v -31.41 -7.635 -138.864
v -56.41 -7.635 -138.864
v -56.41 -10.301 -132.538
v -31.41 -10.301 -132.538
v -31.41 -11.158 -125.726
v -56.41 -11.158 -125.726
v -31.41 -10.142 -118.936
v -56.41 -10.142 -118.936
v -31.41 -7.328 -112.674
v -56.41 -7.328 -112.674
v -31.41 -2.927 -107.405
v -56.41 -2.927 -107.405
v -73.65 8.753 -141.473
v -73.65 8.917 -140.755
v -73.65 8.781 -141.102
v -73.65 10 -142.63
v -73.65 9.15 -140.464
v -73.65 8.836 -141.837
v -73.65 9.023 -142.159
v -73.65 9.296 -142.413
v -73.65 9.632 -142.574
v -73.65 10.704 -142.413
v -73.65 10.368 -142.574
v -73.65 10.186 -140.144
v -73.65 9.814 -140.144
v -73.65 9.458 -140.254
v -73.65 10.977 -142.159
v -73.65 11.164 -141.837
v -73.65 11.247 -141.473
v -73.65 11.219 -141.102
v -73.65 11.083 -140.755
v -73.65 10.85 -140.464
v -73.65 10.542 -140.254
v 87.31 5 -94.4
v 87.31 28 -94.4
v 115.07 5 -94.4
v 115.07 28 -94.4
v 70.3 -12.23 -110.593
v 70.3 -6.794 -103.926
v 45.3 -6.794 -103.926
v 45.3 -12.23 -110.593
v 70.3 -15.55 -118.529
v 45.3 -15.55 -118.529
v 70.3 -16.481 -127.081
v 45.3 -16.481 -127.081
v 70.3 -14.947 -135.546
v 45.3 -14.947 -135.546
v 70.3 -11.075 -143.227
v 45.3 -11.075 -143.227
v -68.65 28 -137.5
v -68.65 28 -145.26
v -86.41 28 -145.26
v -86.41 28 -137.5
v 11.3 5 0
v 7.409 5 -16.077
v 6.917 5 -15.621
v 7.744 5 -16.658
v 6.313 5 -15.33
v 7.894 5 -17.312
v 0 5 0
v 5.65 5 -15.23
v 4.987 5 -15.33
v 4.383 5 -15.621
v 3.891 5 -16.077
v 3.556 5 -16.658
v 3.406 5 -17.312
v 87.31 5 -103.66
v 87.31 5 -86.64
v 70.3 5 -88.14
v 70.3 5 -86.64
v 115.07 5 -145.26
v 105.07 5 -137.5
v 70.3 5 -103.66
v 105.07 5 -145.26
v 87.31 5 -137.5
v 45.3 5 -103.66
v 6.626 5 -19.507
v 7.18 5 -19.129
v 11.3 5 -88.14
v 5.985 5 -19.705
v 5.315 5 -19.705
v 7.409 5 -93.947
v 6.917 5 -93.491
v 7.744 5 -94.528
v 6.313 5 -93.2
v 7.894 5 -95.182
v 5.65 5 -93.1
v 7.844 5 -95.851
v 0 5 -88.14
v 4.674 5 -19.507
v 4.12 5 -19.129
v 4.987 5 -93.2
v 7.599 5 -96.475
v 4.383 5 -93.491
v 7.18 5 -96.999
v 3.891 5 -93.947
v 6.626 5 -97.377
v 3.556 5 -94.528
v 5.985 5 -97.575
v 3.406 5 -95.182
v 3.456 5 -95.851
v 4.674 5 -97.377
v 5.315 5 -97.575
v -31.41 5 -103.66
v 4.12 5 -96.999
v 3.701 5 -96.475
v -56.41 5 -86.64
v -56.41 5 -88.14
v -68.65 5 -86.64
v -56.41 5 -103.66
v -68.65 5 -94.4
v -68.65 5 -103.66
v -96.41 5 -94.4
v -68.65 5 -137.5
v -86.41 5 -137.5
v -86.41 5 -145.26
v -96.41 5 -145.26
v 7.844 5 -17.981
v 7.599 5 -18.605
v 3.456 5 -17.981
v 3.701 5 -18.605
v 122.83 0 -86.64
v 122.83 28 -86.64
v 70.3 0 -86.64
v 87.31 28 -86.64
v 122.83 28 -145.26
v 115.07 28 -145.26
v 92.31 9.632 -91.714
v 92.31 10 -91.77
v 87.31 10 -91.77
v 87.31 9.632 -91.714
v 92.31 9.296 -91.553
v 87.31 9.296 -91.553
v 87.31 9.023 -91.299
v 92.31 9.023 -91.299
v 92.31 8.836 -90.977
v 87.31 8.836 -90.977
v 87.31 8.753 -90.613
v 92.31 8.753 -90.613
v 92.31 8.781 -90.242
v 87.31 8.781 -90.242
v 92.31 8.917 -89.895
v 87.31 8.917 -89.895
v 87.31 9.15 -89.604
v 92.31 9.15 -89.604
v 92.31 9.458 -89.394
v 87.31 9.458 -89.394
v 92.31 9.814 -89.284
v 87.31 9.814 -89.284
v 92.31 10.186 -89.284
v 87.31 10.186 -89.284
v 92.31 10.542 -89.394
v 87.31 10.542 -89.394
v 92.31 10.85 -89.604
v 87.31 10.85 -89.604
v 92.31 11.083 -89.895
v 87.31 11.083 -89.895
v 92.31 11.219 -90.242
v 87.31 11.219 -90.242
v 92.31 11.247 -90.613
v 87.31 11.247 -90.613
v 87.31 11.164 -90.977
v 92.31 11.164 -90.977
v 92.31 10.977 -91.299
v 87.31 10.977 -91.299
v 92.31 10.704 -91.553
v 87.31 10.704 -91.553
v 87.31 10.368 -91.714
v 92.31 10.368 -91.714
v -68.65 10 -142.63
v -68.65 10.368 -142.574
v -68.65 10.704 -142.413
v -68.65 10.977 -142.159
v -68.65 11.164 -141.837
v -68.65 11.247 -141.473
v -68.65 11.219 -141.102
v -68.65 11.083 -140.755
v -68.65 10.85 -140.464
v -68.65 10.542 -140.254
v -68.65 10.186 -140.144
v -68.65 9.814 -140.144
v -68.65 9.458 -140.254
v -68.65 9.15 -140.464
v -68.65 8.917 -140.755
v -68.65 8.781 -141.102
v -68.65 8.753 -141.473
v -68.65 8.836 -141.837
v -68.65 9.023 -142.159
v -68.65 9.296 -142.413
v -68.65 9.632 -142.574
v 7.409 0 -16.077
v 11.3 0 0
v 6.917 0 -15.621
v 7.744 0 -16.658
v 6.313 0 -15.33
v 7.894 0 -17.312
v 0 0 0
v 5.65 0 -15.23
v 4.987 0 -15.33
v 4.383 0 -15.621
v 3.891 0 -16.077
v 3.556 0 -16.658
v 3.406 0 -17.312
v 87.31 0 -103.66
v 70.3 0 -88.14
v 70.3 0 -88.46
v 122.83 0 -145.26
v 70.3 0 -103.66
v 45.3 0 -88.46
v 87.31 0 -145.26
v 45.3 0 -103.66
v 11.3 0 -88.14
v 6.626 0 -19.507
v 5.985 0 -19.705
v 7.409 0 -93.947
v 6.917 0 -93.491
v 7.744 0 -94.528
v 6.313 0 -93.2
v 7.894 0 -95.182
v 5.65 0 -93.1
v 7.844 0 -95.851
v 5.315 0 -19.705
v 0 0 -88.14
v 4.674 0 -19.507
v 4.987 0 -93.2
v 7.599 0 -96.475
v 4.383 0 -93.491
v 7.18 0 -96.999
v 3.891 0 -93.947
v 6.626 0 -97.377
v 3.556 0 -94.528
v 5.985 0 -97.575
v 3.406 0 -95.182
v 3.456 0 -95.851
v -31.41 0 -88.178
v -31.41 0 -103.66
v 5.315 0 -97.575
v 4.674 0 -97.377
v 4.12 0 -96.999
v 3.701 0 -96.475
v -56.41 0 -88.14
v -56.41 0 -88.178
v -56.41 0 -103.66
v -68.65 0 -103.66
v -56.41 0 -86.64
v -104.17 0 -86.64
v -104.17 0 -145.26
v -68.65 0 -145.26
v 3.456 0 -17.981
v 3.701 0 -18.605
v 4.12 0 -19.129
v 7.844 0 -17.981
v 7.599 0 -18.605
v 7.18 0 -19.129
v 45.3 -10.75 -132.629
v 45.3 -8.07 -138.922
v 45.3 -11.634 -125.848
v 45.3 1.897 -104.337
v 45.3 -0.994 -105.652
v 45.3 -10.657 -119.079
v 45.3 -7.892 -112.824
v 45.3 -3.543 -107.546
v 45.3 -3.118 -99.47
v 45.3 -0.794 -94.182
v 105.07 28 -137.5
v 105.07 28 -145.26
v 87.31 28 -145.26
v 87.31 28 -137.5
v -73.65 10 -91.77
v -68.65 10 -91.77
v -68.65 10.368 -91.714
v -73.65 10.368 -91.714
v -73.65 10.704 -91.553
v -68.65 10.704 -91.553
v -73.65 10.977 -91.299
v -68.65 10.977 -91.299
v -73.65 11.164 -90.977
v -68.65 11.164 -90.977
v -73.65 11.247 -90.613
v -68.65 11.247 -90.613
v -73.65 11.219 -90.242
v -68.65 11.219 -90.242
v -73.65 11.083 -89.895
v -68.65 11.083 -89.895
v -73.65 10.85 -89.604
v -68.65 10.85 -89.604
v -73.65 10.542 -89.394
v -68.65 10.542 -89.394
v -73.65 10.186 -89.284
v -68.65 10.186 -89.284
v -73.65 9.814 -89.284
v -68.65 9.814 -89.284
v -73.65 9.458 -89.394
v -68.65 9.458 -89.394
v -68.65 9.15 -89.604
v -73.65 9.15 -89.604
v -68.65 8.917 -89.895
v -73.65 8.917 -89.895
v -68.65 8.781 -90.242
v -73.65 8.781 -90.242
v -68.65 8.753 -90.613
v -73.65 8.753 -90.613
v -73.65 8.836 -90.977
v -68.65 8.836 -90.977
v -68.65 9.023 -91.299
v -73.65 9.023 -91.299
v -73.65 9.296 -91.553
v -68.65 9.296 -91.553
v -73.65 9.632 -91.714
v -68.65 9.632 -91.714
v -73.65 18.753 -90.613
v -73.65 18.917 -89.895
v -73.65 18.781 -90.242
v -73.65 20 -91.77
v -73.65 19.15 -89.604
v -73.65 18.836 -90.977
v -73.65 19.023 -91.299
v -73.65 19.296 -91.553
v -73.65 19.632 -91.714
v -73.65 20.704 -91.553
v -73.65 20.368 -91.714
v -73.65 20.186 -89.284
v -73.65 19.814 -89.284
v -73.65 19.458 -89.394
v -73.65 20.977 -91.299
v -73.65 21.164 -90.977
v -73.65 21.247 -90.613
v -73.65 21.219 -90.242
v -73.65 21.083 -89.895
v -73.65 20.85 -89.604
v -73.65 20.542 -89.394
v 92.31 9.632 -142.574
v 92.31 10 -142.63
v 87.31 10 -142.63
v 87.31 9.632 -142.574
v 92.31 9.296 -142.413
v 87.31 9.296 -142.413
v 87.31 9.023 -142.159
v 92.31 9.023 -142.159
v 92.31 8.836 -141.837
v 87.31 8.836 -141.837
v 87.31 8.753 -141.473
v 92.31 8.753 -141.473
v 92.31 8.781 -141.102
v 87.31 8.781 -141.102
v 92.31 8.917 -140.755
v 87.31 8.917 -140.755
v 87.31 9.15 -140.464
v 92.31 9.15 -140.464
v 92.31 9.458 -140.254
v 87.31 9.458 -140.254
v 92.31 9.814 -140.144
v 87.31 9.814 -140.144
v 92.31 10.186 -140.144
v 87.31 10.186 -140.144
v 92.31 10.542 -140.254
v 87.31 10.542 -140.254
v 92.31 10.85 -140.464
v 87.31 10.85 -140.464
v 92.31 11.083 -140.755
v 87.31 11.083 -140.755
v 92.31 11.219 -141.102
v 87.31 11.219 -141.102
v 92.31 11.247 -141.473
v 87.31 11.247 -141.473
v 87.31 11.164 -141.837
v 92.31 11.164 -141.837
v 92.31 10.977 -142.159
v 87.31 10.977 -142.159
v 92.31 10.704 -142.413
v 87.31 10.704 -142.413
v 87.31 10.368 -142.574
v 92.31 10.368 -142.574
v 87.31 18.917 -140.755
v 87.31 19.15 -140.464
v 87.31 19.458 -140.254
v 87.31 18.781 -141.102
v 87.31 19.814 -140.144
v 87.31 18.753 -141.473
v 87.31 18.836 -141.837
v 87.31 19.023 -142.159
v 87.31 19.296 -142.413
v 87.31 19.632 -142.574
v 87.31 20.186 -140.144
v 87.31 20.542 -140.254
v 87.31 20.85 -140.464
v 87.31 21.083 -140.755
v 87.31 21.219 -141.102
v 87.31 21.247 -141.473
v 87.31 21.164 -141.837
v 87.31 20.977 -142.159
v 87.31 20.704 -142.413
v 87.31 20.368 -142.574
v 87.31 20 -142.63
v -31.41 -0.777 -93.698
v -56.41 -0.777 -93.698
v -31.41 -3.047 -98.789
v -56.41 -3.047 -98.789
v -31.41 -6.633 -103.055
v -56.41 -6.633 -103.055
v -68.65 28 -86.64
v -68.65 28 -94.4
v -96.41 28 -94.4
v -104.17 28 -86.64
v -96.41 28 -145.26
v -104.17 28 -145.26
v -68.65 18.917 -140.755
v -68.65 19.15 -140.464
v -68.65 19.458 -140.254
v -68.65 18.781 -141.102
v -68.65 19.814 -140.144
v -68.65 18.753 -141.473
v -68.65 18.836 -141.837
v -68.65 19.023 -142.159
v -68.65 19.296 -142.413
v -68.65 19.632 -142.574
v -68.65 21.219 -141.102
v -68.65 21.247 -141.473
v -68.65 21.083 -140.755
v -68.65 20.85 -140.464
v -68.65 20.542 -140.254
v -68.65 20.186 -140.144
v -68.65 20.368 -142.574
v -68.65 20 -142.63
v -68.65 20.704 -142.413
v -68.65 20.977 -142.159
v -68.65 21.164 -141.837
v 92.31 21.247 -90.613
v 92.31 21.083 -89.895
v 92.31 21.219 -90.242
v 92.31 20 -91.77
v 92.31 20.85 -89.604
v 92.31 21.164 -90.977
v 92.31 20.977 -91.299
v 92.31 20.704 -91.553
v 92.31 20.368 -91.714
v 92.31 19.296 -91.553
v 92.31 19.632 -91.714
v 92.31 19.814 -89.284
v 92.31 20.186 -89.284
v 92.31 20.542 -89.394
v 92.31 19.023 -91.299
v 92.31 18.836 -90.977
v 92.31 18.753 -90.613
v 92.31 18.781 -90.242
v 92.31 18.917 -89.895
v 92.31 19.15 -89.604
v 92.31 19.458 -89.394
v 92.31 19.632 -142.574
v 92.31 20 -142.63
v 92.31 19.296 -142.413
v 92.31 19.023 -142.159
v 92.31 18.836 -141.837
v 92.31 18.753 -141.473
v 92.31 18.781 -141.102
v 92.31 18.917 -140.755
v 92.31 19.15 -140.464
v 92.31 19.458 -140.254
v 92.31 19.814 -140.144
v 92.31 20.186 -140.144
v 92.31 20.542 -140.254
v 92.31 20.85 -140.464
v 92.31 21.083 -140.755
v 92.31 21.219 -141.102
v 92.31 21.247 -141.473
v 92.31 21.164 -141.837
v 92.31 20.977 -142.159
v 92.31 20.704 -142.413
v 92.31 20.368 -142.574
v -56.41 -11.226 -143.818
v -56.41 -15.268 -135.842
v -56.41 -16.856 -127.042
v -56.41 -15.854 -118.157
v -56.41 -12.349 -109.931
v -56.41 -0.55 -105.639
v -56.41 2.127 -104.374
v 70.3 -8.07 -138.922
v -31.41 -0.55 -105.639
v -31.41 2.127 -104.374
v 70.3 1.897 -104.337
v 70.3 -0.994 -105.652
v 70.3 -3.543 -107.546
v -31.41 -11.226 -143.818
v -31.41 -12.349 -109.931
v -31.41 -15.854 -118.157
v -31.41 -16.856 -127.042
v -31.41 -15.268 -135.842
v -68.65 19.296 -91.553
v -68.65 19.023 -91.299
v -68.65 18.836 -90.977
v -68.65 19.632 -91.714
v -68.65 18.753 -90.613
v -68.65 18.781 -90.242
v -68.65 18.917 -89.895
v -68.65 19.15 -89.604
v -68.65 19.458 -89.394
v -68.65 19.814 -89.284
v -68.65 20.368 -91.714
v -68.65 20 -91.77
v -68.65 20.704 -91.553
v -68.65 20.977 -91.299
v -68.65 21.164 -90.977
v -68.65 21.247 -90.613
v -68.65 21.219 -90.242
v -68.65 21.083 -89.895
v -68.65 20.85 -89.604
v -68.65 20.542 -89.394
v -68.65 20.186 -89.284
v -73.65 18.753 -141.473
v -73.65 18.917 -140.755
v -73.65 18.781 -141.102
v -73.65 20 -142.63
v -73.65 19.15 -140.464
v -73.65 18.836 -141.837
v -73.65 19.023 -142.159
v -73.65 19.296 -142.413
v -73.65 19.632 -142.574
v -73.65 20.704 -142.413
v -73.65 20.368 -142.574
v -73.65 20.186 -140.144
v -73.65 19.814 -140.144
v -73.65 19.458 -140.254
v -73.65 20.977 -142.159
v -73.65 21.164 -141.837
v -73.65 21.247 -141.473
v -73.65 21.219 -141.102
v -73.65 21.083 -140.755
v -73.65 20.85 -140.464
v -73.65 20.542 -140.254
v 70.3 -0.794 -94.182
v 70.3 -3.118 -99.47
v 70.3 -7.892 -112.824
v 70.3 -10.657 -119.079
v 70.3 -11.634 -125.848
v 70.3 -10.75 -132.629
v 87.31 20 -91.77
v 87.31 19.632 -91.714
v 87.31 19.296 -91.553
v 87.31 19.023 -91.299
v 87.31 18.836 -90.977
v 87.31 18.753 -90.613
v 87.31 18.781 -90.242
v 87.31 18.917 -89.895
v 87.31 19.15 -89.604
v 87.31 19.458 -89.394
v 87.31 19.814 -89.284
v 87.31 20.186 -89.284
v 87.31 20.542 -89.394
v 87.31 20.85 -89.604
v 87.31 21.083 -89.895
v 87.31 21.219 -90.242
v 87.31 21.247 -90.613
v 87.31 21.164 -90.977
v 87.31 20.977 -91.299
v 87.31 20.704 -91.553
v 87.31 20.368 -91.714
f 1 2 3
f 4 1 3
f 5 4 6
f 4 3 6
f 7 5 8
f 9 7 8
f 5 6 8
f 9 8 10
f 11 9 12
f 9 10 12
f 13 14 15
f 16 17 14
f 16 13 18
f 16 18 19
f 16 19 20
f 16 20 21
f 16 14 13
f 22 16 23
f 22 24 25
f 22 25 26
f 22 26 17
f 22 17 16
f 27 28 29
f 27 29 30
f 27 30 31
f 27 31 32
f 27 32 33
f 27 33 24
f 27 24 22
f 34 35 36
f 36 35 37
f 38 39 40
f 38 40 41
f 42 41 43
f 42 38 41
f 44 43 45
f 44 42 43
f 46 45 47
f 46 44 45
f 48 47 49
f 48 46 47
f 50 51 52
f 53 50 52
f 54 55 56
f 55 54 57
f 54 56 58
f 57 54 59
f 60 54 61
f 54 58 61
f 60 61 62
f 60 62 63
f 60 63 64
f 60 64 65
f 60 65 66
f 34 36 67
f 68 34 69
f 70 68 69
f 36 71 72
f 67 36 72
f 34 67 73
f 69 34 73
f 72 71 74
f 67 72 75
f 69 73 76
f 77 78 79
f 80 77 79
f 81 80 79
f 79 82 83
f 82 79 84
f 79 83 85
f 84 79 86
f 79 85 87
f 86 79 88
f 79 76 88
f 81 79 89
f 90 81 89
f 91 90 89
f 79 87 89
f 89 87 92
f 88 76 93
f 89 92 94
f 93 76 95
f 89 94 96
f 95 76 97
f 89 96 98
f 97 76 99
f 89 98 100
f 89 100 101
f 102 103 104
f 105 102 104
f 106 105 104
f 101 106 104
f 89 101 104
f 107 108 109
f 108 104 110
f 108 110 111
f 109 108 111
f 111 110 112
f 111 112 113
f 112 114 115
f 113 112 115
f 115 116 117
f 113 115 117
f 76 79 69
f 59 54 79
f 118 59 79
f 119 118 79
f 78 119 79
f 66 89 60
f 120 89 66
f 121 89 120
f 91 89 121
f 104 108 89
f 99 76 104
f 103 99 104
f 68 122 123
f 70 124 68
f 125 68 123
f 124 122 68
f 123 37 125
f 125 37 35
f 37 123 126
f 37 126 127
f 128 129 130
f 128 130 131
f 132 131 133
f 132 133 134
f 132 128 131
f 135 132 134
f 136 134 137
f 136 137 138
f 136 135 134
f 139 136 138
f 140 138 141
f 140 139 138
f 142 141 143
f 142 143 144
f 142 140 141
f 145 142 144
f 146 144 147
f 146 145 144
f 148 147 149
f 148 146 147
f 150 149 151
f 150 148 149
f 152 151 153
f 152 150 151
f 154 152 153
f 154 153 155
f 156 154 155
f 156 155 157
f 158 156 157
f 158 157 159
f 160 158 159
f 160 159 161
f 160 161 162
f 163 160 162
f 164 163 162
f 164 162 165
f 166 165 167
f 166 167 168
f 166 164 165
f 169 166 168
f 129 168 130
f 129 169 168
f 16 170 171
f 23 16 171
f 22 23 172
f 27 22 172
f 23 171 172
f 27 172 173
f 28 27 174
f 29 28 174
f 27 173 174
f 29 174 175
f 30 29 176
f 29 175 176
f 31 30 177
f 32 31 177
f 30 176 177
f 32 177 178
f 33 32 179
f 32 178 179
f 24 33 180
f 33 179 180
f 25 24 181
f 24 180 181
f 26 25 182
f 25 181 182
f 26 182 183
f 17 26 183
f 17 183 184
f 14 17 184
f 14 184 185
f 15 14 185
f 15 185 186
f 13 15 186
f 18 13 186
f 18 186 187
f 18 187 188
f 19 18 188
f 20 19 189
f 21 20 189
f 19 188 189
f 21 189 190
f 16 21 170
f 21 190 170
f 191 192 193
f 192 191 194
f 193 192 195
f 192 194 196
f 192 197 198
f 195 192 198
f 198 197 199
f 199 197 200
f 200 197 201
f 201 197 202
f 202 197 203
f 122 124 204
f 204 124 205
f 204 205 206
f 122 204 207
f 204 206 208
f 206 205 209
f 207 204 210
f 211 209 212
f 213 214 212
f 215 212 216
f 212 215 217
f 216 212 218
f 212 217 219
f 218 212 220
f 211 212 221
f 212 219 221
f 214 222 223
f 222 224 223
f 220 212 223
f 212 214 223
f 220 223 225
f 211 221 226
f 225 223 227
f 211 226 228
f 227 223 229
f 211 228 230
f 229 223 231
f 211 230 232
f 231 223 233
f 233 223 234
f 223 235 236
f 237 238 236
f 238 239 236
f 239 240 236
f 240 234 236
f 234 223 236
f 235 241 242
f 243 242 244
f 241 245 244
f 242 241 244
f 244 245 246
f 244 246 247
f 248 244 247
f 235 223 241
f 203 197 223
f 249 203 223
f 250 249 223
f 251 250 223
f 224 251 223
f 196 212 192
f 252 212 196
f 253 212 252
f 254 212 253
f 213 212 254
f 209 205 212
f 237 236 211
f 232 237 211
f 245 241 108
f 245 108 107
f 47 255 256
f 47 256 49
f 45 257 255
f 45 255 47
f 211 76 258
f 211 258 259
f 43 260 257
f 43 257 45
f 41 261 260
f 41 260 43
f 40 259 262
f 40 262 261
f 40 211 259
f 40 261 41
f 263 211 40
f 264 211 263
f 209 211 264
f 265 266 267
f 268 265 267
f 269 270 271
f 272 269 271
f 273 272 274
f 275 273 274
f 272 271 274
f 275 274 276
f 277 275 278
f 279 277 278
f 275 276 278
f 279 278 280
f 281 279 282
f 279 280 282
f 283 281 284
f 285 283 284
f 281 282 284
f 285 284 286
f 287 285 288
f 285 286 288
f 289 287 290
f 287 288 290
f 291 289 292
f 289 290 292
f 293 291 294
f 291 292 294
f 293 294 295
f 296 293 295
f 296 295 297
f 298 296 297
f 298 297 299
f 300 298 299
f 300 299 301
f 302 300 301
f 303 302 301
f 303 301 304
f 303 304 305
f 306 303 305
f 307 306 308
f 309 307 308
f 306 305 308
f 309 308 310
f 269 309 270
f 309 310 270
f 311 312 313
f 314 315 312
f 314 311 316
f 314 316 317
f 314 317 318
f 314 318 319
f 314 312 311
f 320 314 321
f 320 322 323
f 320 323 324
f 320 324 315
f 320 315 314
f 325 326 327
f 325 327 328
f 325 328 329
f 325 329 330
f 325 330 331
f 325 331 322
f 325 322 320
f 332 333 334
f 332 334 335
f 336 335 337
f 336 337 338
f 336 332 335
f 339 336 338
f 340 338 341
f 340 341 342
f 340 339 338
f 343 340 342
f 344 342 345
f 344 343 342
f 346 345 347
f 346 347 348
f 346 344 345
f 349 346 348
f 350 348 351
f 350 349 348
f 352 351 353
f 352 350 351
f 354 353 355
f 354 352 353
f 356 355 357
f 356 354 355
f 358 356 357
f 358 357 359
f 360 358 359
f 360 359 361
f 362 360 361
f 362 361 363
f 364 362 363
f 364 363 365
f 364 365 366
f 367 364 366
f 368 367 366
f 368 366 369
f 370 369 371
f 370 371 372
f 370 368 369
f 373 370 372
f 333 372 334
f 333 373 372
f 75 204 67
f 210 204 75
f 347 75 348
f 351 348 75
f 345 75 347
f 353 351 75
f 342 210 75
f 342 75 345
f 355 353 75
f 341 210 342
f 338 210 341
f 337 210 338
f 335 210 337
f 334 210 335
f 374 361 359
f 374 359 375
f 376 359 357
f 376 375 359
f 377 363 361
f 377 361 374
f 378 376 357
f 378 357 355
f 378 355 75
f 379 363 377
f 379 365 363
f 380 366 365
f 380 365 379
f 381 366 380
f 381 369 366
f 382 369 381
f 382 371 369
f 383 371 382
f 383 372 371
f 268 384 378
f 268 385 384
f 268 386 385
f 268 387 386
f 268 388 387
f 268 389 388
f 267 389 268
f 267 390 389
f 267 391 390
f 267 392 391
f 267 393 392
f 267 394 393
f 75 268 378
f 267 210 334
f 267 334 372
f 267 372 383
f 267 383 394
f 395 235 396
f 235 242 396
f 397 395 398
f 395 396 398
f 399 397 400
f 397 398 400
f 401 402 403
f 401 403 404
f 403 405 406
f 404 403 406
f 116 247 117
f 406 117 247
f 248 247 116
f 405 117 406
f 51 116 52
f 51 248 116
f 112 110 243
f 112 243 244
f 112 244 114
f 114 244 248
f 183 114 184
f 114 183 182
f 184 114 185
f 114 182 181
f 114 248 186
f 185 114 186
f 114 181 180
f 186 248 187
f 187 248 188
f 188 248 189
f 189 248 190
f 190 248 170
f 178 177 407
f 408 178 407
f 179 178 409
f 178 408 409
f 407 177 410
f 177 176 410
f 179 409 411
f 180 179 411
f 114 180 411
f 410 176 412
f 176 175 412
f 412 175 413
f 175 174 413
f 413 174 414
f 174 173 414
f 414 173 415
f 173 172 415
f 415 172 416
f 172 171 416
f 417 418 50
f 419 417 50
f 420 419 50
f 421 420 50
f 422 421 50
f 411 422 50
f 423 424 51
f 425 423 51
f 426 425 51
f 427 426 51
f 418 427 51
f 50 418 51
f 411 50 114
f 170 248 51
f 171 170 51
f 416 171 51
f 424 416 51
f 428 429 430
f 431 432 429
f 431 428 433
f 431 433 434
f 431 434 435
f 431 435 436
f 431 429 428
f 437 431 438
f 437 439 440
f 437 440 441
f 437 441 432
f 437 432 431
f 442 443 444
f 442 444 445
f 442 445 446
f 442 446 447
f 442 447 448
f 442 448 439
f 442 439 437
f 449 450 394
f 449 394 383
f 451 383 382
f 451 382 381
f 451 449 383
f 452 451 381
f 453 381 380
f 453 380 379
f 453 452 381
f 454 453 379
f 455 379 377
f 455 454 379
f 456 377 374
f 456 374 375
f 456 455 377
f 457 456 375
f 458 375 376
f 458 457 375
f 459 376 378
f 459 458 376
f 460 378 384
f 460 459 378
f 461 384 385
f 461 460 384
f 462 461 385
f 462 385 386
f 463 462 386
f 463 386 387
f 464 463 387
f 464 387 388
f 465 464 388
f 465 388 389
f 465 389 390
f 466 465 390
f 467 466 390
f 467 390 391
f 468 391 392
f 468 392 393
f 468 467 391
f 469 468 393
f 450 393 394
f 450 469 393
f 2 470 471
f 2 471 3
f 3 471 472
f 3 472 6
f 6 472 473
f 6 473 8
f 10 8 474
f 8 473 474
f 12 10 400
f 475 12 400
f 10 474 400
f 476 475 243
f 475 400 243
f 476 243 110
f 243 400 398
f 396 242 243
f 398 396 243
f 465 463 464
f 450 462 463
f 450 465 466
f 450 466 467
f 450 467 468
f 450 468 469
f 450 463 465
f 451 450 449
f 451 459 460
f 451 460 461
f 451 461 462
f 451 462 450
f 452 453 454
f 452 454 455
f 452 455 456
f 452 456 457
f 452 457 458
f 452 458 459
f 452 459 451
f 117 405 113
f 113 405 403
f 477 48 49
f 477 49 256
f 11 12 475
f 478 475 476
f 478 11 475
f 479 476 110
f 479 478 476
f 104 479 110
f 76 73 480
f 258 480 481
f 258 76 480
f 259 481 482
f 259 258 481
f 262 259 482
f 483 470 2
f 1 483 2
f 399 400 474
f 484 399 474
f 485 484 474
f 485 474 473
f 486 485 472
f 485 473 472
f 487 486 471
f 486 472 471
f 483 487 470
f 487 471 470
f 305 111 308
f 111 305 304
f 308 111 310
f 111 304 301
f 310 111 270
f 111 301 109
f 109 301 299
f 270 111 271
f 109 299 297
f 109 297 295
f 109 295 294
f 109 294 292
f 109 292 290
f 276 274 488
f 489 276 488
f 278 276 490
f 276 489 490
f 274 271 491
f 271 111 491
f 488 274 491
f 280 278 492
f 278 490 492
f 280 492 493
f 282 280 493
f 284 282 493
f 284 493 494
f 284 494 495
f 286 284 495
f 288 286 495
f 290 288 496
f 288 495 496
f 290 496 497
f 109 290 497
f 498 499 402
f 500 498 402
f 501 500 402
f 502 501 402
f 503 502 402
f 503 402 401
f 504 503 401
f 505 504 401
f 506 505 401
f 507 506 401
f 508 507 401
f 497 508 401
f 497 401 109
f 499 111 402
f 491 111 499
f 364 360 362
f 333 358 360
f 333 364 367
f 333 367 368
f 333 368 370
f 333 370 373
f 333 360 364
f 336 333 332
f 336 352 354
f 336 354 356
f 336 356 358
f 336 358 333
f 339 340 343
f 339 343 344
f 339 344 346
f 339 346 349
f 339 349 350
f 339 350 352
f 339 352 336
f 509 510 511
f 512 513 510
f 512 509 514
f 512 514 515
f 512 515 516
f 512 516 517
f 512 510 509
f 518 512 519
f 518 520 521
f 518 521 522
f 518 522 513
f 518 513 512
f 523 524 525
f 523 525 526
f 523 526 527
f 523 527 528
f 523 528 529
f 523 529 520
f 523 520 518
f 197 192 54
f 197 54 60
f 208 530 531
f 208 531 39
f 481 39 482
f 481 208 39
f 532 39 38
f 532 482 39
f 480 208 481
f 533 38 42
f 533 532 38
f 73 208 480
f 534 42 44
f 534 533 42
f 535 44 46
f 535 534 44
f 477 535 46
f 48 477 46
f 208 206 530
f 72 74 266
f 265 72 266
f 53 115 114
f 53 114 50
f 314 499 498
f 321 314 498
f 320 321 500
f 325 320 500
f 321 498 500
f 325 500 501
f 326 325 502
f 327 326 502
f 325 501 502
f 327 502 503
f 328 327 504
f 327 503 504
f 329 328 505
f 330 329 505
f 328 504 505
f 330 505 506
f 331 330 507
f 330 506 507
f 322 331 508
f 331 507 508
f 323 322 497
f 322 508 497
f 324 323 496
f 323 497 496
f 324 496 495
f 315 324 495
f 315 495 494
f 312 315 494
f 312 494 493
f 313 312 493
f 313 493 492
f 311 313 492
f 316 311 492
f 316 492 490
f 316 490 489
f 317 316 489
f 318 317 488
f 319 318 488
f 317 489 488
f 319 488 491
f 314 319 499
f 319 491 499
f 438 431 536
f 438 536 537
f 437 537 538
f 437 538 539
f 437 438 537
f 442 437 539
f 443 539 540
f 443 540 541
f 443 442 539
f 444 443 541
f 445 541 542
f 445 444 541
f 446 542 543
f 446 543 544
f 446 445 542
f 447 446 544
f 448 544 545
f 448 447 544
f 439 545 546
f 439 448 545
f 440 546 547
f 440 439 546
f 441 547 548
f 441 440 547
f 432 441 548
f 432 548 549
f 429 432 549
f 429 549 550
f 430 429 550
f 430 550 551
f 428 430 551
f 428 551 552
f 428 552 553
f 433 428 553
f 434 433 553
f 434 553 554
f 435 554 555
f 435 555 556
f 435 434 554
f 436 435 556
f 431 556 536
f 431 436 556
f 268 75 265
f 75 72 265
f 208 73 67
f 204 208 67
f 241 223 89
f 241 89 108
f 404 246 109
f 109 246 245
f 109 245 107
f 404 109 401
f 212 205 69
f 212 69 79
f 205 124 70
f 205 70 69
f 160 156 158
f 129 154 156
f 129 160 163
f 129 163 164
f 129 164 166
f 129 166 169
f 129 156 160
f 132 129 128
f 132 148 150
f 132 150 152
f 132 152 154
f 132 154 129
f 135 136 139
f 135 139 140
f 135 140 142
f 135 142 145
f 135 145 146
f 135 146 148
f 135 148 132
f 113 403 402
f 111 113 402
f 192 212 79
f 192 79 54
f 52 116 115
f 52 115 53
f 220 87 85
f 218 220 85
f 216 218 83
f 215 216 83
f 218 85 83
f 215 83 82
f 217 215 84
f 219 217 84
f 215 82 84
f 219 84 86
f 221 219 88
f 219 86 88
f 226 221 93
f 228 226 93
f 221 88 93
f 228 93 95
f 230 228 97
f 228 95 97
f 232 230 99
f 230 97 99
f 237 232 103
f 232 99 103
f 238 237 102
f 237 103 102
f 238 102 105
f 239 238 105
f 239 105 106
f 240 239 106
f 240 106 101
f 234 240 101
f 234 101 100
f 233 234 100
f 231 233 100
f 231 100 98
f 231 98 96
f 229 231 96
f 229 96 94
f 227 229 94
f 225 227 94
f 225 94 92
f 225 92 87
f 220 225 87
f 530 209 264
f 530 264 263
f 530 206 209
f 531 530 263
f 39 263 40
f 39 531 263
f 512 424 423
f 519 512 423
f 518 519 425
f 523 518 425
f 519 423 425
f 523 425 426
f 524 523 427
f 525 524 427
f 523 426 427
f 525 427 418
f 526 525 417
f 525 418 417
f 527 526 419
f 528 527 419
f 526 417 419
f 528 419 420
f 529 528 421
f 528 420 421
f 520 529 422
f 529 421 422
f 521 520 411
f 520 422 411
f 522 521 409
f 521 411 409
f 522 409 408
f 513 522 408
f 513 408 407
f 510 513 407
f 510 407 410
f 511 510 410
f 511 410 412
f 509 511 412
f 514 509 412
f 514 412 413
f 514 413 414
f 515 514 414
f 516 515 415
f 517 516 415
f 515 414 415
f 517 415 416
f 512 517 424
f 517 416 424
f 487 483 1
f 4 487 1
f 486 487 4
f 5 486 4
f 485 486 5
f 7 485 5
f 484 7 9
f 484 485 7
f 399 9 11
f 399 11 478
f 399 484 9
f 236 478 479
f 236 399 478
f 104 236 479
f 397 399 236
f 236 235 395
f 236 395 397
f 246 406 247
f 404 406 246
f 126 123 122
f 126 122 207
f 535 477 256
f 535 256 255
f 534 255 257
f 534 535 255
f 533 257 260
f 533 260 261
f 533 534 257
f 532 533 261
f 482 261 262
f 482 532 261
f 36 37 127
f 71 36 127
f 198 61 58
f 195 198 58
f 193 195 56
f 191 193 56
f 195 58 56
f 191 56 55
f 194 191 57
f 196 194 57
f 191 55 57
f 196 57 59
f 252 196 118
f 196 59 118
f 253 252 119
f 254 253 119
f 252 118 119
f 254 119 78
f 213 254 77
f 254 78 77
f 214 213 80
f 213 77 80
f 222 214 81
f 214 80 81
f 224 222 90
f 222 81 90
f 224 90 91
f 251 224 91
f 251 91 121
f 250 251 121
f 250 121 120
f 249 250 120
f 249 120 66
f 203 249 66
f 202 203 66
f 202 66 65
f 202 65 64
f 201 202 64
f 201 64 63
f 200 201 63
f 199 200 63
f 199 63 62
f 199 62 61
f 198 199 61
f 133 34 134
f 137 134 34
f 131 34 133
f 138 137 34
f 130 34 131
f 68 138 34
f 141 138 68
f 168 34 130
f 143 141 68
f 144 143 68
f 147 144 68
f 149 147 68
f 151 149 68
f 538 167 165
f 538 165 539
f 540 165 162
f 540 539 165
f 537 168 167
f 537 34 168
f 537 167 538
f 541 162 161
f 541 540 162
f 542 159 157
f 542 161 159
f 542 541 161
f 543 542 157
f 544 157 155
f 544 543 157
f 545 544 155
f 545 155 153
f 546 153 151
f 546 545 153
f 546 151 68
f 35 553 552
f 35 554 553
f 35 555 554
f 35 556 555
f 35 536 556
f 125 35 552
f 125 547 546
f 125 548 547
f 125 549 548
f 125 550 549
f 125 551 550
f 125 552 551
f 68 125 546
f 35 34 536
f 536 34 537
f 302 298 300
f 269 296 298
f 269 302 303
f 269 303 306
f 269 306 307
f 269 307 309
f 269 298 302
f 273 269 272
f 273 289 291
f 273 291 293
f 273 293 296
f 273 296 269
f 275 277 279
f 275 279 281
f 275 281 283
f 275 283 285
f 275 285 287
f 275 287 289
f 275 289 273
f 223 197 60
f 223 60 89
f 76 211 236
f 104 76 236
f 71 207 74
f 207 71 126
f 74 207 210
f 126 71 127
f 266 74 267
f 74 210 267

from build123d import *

# Parameters (mm, degrees)
BOSS_EXTRUDE1_DEPTH  = 5
SKETCH6_W            = 1.81
SKETCH6_H            = 7.76
SKETCH6_W_2          = 18.76
BOSS_EXTRUDE2_DEPTH  = 28
BOSS_EXTRUDE3_REACH  = 259.198
SKETCH7_W            = 7.76
SKETCH7_H            = 5
SKETCH9_W            = 27.76
SKETCH9_H            = 5
BOSS_EXTRUDE4_DEPTH  = 58.62
BOSS_EXTRUDE5_REACH  = 189.418
SKETCH10_W           = 27.76
SKETCH10_H           = 7.76
SKETCH11_W           = 58.62
SKETCH11_H           = 33
BOSS_EXTRUDE6_DEPTH  = 7.76
SKETCH12_R           = 2.25
CUT_EXTRUDE1_DEPTH   = 188.418175479
SKETCH13_W           = 1.81
SKETCH13_H           = 7.76
SKETCH13_W_2         = 18.76
BOSS_EXTRUDE7_DEPTH  = 28
BOSS_EXTRUDE8_REACH  = 265.563
SKETCH14_W           = 7.76
SKETCH14_H           = 5
SKETCH15_W           = 27.76
SKETCH15_H           = 5
BOSS_EXTRUDE9_DEPTH  = 50.86
BOSS_EXTRUDE10_REACH = 189.418
SKETCH16_W           = 27.76
SKETCH16_H           = 7.76
SKETCH17_W           = 58.62
SKETCH17_H           = 33
BOSS_EXTRUDE11_DEPTH = 7.76
CUT_EXTRUDE4_REACH   = 195.072
SKETCH23_W           = 35.52
SKETCH23_H           = 5
CUT_EXTRUDE5_REACH   = 195.072
SKETCH24_W           = 35.52
SKETCH24_H           = 5
SKETCH25_W           = 7.76
SKETCH25_H           = 23
CUT_EXTRUDE6_DEPTH   = 1.81
SKETCH26_W           = 7.76
SKETCH26_H           = 23
CUT_EXTRUDE7_DEPTH   = 1.81
SKETCH27_R           = 1.25
CUT_EXTRUDE8_DEPTH   = 5
CUT_EXTRUDE9_START   = -5
SKETCH28_R           = 1.25
CUT_EXTRUDE9_DEPTH   = 5
BOSS_EXTRUDE14_DEPTH = 25
SKETCH30_W           = 7.667684365
SKETCH30_H           = 9.552630881
CUT_EXTRUDE13_DEPTH  = 30
FILLET2_R            = 15
CUT_EXTRUDE14_REACH  = 193.616
SKETCH31_W           = 5
SKETCH31_H           = 41.6
FILLET6_R            = 21
BOSS_EXTRUDE15_DEPTH = 25
FILLET7_R            = 15
FILLET8_R            = 20
SKETCH37_W           = 7.377214054
SKETCH37_H           = 9
CUT_EXTRUDE16_DEPTH  = 25
CUT_EXTRUDE17_REACH  = 194.28
SKETCH38_W           = 1
SKETCH38_H           = 23
SKETCH39_W           = 12.24
SKETCH39_H           = 5
SKETCH39_W_2         = 12.01
CUT_EXTRUDE19_DEPTH  = 41.6


with BuildPart() as part:
    # Sketch5 → Boss-Extrude1 (new body)
    with BuildSketch(Plane(origin=(0, 0, 0), x_dir=(1, 0, 0), z_dir=(0, 1, 0))):
        Polygon((0, 0), (0, 88.14), (-56.41, 88.14), (-56.41, 86.64), (-96.41, 86.64), (-96.41, 145.26), (-56.41, 145.26), (-56.41, 103.66), (9.075, 103.66), (70.3, 103.66), (70.3, 145.26), (115.07, 145.26), (115.07, 86.64), (70.3, 86.64), (70.3, 88.14), (11.3, 88.14), (11.3, 0), align=None)
    extrude(amount=BOSS_EXTRUDE1_DEPTH)

    # Sketch6 → Boss-Extrude2 (add)
    with BuildSketch(Plane(origin=(0, 5, 0), x_dir=(1, 0, 0), z_dir=(0, 1, 0))):
        with Locations((-95.505, 141.38)):
            Rectangle(SKETCH6_W, SKETCH6_H)
        with Locations((-78.03, 141.38)):
            Rectangle(SKETCH6_W_2, SKETCH6_H)
    extrude(amount=BOSS_EXTRUDE2_DEPTH)

    # Sketch7 → Boss-Extrude3 (add, up to next)
    with BuildSketch(Plane(origin=(-94.6, 0, 0), x_dir=(0, 0, -1), z_dir=(1, 0, 0)), mode=Mode.PRIVATE) as boss_extrude3_sk1:
        with Locations((141.38, 30.5)):
            Rectangle(SKETCH7_W, SKETCH7_H)
    boss_extrude3_tool1 = extrude(boss_extrude3_sk1.sketch, amount=BOSS_EXTRUDE3_REACH, mode=Mode.PRIVATE) - part.part
    add(boss_extrude3_tool1.solids().sort_by_distance((-94.6, 30.5, -141.38))[0])

    # Sketch9 → Boss-Extrude4 (add)
    with BuildSketch(Plane(origin=(0, 0, -145.26), x_dir=(-1, 0, 0), z_dir=(0, 0, -1))):
        with Locations((82.53, 30.5)):
            Rectangle(SKETCH9_W, SKETCH9_H)
    extrude(amount=-BOSS_EXTRUDE4_DEPTH)

    # Sketch10 → Boss-Extrude5 (add, up to next)
    with BuildSketch(Plane.XZ.offset(-28), mode=Mode.PRIVATE) as boss_extrude5_sk1:
        with Locations((-82.53, -90.52)):
            Rectangle(SKETCH10_W, SKETCH10_H)
    boss_extrude5_tool1 = extrude(boss_extrude5_sk1.sketch, amount=BOSS_EXTRUDE5_REACH, mode=Mode.PRIVATE) - part.part
    add(boss_extrude5_tool1.solids().sort_by_distance((-82.53, 28, -90.52))[0])

    # Sketch11 → Boss-Extrude6 (add)
    with BuildSketch(Plane.ZY.offset(96.41)):
        with Locations((-115.95, 16.5)):
            Rectangle(SKETCH11_W, SKETCH11_H)
    extrude(amount=BOSS_EXTRUDE6_DEPTH)

    # Sketch12 → Cut-Extrude1 (cut, through all)
    with BuildSketch(Plane(origin=(0, 5, 0), x_dir=(1, 0, 0), z_dir=(0, 1, 0))):
        with Locations(Location((5.65, 17.48, 0), (0, 0, 270))):
            Circle(SKETCH12_R)
        with Locations(Location((5.65, 95.35, 0), (0, 0, 270))):
            Circle(SKETCH12_R)
    extrude(amount=-CUT_EXTRUDE1_DEPTH, mode=Mode.SUBTRACT)

    # Sketch13 → Boss-Extrude7 (add)
    with BuildSketch(Plane(origin=(0, 5, 0), x_dir=(1, 0, 0), z_dir=(0, 1, 0))):
        with Locations((114.165, 141.38)):
            Rectangle(SKETCH13_W, SKETCH13_H)
        with Locations((96.69, 141.38)):
            Rectangle(SKETCH13_W_2, SKETCH13_H)
    extrude(amount=BOSS_EXTRUDE7_DEPTH)

    # Sketch14 → Boss-Extrude8 (add, up to next)
    with BuildSketch(Plane.ZY.offset(-113.26), mode=Mode.PRIVATE) as boss_extrude8_sk1:
        with Locations((-141.38, 30.5)):
            Rectangle(SKETCH14_W, SKETCH14_H)
    boss_extrude8_tool1 = extrude(boss_extrude8_sk1.sketch, amount=BOSS_EXTRUDE8_REACH, mode=Mode.PRIVATE) - part.part
    add(boss_extrude8_tool1.solids().sort_by_distance((113.26, 30.5, -141.38))[0])

    # Sketch15 → Boss-Extrude9 (add)
    with BuildSketch(Plane.XY.offset(-137.5)):
        with Locations((101.19, 30.5)):
            Rectangle(SKETCH15_W, SKETCH15_H)
    extrude(amount=BOSS_EXTRUDE9_DEPTH)

    # Sketch16 → Boss-Extrude10 (add, up to next)
    with BuildSketch(Plane.XZ.offset(-28), mode=Mode.PRIVATE) as boss_extrude10_sk1:
        with Locations((101.19, -90.52)):
            Rectangle(SKETCH16_W, SKETCH16_H)
    boss_extrude10_tool1 = extrude(boss_extrude10_sk1.sketch, amount=BOSS_EXTRUDE10_REACH, mode=Mode.PRIVATE) - part.part
    add(boss_extrude10_tool1.solids().sort_by_distance((101.19, 28, -90.52))[0])

    # Sketch17 → Boss-Extrude11 (add)
    with BuildSketch(Plane(origin=(115.07, 0, 0), x_dir=(0, 0, -1), z_dir=(1, 0, 0))):
        with Locations((115.95, 16.5)):
            Rectangle(SKETCH17_W, SKETCH17_H)
    extrude(amount=BOSS_EXTRUDE11_DEPTH)

    # Sketch23 → Cut-Extrude4 (cut, up to next)
    with BuildSketch(Plane(origin=(0, 0, -145.26), x_dir=(-1, 0, 0), z_dir=(0, 0, -1)), mode=Mode.PRIVATE) as cut_extrude4_sk1:
        with Locations((-105.07, 30.5)):
            Rectangle(SKETCH23_W, SKETCH23_H)
    cut_extrude4_tool1 = extrude(cut_extrude4_sk1.sketch, amount=-CUT_EXTRUDE4_REACH, mode=Mode.PRIVATE) & part.part
    add(cut_extrude4_tool1.solids().sort_by_distance((105.07, 30.5, -145.26))[0], mode=Mode.SUBTRACT)

    # Sketch24 → Cut-Extrude5 (cut, up to next)
    with BuildSketch(Plane(origin=(0, 0, -145.26), x_dir=(-1, 0, 0), z_dir=(0, 0, -1)), mode=Mode.PRIVATE) as cut_extrude5_sk1:
        with Locations((86.41, 30.5)):
            Rectangle(SKETCH24_W, SKETCH24_H)
    cut_extrude5_tool1 = extrude(cut_extrude5_sk1.sketch, amount=-CUT_EXTRUDE5_REACH, mode=Mode.PRIVATE) & part.part
    add(cut_extrude5_tool1.solids().sort_by_distance((-86.41, 30.5, -145.26))[0], mode=Mode.SUBTRACT)

    # Sketch25 → Cut-Extrude6 (cut)
    with BuildSketch(Plane(origin=(-94.6, 0, 0), x_dir=(0, 0, -1), z_dir=(1, 0, 0))):
        with Locations((141.38, 16.5)):
            Rectangle(SKETCH25_W, SKETCH25_H)
    extrude(amount=-CUT_EXTRUDE6_DEPTH, mode=Mode.SUBTRACT)

    # Sketch26 → Cut-Extrude7 (cut)
    with BuildSketch(Plane.ZY.offset(-113.26)):
        with Locations((-141.38, 16.5)):
            Rectangle(SKETCH26_W, SKETCH26_H)
    extrude(amount=-CUT_EXTRUDE7_DEPTH, mode=Mode.SUBTRACT)

    # Sketch27 → Cut-Extrude8 (cut)
    with BuildSketch(Plane(origin=(-68.65, 0, 0), x_dir=(0, 0, -1), z_dir=(1, 0, 0))):
        with Locations((141.38, 10)):
            Circle(SKETCH27_R)
        with Locations((141.38, 20)):
            Circle(SKETCH27_R)
        with Locations((90.52, 10)):
            Circle(SKETCH27_R)
        with Locations((90.52, 20)):
            Circle(SKETCH27_R)
    extrude(amount=-CUT_EXTRUDE8_DEPTH, mode=Mode.SUBTRACT)

    # Sketch28 → Cut-Extrude9 (cut)
    with BuildSketch(Plane.ZY.offset(-87.31).offset(CUT_EXTRUDE9_START)):
        with Locations(Location((-90.52, 10, 0), (0, 0, 180))):
            Circle(SKETCH28_R)
        with Locations(Location((-90.52, 20, 0), (0, 0, 180))):
            Circle(SKETCH28_R)
        with Locations(Location((-141.38, 10, 0), (0, 0, 180))):
            Circle(SKETCH28_R)
        with Locations(Location((-141.38, 20, 0), (0, 0, 180))):
            Circle(SKETCH28_R)
    extrude(amount=CUT_EXTRUDE9_DEPTH, mode=Mode.SUBTRACT)

    # Sketch29 → Boss-Extrude14 (add)
    with BuildSketch(Plane.ZY.offset(-70.3)):
        with BuildLine():
            Line((-100.885806154, 13.5), (-96.02, 13.5))
            ThreePointArc((-96.02, 13.5), (-112.167541603, -13.110324995), (-143.227293091, -11.074561329))
            Line((-143.227293091, -11.074561329), (-138.921656543, -8.070233163))
            ThreePointArc((-138.921656543, -8.070233163), (-113.621311283, -8.363216103), (-100.885806154, 13.5))
        make_face()
    extrude(amount=BOSS_EXTRUDE14_DEPTH)

    # Sketch30 → Cut-Extrude13 (cut)
    with BuildSketch(Plane.ZY.offset(-45.3)):
        with Locations((-98.532876856, 9.77631544)):
            Rectangle(SKETCH30_W, SKETCH30_H)
    extrude(amount=-CUT_EXTRUDE13_DEPTH, mode=Mode.SUBTRACT)

    # Fillet2
    # the kernel refuses this fillet: 15 mm, written as the material it adds along each edge
    with BuildSketch(Plane(origin=(45.3, 2.021406869, -103.66), x_dir=(0, 1, 0), z_dir=(1, 0, 0))) as fillet2_piece_1:
        with BuildLine():
            CenterArc((4.606944532, -14.911353785), FILLET2_R, 96.232125796, 36.460543552)
            Line((-5.564040014, -3.886333451), (-5.767459705, -3.665833045))
            ThreePointArc((-5.767459705, -3.665833045), (-3.085586749, -1.508552064), (-0.137007694, 0.266887414))
            Line((-0.137007694, 0.266887414), (0, 0.3))
            ThreePointArc((0, 0.3), (1.489296566, 0.3), (2.946026103, 0.298227076))
            Line((2.946026103, 0.298227076), (2.978593131, 0))
        make_face()
    extrude(amount=25)

    # Sketch31 → Cut-Extrude14 (cut, up to next)
    with BuildSketch(Plane(origin=(0, 5, 0), x_dir=(1, 0, 0), z_dir=(0, 1, 0)), mode=Mode.PRIVATE) as cut_extrude14_sk1:
        with Locations((72.8, 124.46)):
            Rectangle(SKETCH31_W, SKETCH31_H)
    cut_extrude14_tool1 = extrude(cut_extrude14_sk1.sketch, amount=-CUT_EXTRUDE14_REACH, mode=Mode.PRIVATE) & part.part
    add(cut_extrude14_tool1.solids().sort_by_distance((72.8, 5, -124.46))[0], mode=Mode.SUBTRACT)

    # Fillet6
    fillet6_edges = [part.edges().sort_by_distance(p)[0] for p in [
        (57.8, 0, -99.229143351),
    ]]
    fillet(fillet6_edges, radius=FILLET6_R)

    # Sketch35 → Boss-Extrude15 (add)
    with BuildSketch(Plane(origin=(-56.41, 0, 0), x_dir=(0, 0, -1), z_dir=(1, 0, 0))):
        with BuildLine():
            Line((100.859945263, 14), (95.147502284, 14))
            ThreePointArc((95.147502284, 14), (111.813431349, -13.409569906), (143.817650668, -11.226072741))
            Line((143.817650668, -11.226072741), (138.864061969, -7.634657993))
            ThreePointArc((138.864061969, -7.634657993), (113.572690006, -7.865333939), (100.859945263, 14))
        make_face()
    extrude(amount=BOSS_EXTRUDE15_DEPTH)

    # Fillet7
    # the kernel refuses this fillet: 15 mm, written as the material it adds along each edge
    with BuildSketch(Plane(origin=(-31.41, 2.464890362, -103.66), x_dir=(0, -0.8213043286229281, -0.5704903152422844), z_dir=(-1, 0, 0))) as fillet7_piece_1:
        with BuildLine():
            CenterArc((4.607787404, -14.871807742), FILLET7_R, 82.503946448, 33.982894416)
            Line((-2.082096519, -1.446255497), (-2.215894198, -1.177744452))
            ThreePointArc((-2.215894198, -1.177744452), (-1.212195354, -0.47673645), (-0.171147095, 0.246391299))
            Line((-0.171147095, 0.246391299), (-0.039137371, 0.297436155))
            ThreePointArc((-0.039137371, 0.297436155), (3.282327972, 0.515021615), (6.603793315, 0.297436155))
            Line((6.603793315, 0.297436155), (6.564655944, 0))
        make_face()
    extrude(amount=25)

    # Fillet8
    fillet8_edges = [part.edges().sort_by_distance(p)[0] for p in [
        (-43.91, 0, -98.504347814),
    ]]
    fillet(fillet8_edges, radius=FILLET8_R)

    # Sketch37 → Cut-Extrude16 (cut)
    with BuildSketch(Plane(origin=(-31.41, 0, 0), x_dir=(0, 0, -1), z_dir=(1, 0, 0))):
        with Locations((98.836109311, 9.5)):
            Rectangle(SKETCH37_W, SKETCH37_H)
    extrude(amount=-CUT_EXTRUDE16_DEPTH, mode=Mode.SUBTRACT)

    # Sketch38 → Cut-Extrude17 (cut, up to next)
    with BuildSketch(Plane(origin=(0, 0, -145.26), x_dir=(-1, 0, 0), z_dir=(0, 0, -1)), mode=Mode.PRIVATE) as cut_extrude17_sk1:
        with Locations((86.91, 16.5)):
            Rectangle(SKETCH38_W, SKETCH38_H)
    cut_extrude17_tool1 = extrude(cut_extrude17_sk1.sketch, amount=-CUT_EXTRUDE17_REACH, mode=Mode.PRIVATE) & part.part
    # Sketch38 → Cut-Extrude17 (cut, up to next)
    with BuildSketch(Plane(origin=(0, 0, -145.26), x_dir=(-1, 0, 0), z_dir=(0, 0, -1)), mode=Mode.PRIVATE) as cut_extrude17_sk2:
        with Locations((-105.57, 16.5)):
            Rectangle(SKETCH38_W, SKETCH38_H)
    cut_extrude17_tool2 = extrude(cut_extrude17_sk2.sketch, amount=-CUT_EXTRUDE17_REACH, mode=Mode.PRIVATE) & part.part
    add(cut_extrude17_tool1.solids().sort_by_distance((-86.91, 16.5, -145.26))[0], mode=Mode.SUBTRACT)
    add(cut_extrude17_tool2.solids().sort_by_distance((105.57, 16.5, -145.26))[0], mode=Mode.SUBTRACT)

    # Sketch39 → Cut-Extrude19 (cut)
    with BuildSketch(Plane(origin=(0, 0, -145.26), x_dir=(-1, 0, 0), z_dir=(0, 0, -1))):
        with Locations((62.53, 2.5)):
            Rectangle(SKETCH39_W, SKETCH39_H)
        with Locations((-81.305, 2.5)):
            Rectangle(SKETCH39_W_2, SKETCH39_H)
    extrude(amount=-CUT_EXTRUDE19_DEPTH, mode=Mode.SUBTRACT)


solid = part.part
